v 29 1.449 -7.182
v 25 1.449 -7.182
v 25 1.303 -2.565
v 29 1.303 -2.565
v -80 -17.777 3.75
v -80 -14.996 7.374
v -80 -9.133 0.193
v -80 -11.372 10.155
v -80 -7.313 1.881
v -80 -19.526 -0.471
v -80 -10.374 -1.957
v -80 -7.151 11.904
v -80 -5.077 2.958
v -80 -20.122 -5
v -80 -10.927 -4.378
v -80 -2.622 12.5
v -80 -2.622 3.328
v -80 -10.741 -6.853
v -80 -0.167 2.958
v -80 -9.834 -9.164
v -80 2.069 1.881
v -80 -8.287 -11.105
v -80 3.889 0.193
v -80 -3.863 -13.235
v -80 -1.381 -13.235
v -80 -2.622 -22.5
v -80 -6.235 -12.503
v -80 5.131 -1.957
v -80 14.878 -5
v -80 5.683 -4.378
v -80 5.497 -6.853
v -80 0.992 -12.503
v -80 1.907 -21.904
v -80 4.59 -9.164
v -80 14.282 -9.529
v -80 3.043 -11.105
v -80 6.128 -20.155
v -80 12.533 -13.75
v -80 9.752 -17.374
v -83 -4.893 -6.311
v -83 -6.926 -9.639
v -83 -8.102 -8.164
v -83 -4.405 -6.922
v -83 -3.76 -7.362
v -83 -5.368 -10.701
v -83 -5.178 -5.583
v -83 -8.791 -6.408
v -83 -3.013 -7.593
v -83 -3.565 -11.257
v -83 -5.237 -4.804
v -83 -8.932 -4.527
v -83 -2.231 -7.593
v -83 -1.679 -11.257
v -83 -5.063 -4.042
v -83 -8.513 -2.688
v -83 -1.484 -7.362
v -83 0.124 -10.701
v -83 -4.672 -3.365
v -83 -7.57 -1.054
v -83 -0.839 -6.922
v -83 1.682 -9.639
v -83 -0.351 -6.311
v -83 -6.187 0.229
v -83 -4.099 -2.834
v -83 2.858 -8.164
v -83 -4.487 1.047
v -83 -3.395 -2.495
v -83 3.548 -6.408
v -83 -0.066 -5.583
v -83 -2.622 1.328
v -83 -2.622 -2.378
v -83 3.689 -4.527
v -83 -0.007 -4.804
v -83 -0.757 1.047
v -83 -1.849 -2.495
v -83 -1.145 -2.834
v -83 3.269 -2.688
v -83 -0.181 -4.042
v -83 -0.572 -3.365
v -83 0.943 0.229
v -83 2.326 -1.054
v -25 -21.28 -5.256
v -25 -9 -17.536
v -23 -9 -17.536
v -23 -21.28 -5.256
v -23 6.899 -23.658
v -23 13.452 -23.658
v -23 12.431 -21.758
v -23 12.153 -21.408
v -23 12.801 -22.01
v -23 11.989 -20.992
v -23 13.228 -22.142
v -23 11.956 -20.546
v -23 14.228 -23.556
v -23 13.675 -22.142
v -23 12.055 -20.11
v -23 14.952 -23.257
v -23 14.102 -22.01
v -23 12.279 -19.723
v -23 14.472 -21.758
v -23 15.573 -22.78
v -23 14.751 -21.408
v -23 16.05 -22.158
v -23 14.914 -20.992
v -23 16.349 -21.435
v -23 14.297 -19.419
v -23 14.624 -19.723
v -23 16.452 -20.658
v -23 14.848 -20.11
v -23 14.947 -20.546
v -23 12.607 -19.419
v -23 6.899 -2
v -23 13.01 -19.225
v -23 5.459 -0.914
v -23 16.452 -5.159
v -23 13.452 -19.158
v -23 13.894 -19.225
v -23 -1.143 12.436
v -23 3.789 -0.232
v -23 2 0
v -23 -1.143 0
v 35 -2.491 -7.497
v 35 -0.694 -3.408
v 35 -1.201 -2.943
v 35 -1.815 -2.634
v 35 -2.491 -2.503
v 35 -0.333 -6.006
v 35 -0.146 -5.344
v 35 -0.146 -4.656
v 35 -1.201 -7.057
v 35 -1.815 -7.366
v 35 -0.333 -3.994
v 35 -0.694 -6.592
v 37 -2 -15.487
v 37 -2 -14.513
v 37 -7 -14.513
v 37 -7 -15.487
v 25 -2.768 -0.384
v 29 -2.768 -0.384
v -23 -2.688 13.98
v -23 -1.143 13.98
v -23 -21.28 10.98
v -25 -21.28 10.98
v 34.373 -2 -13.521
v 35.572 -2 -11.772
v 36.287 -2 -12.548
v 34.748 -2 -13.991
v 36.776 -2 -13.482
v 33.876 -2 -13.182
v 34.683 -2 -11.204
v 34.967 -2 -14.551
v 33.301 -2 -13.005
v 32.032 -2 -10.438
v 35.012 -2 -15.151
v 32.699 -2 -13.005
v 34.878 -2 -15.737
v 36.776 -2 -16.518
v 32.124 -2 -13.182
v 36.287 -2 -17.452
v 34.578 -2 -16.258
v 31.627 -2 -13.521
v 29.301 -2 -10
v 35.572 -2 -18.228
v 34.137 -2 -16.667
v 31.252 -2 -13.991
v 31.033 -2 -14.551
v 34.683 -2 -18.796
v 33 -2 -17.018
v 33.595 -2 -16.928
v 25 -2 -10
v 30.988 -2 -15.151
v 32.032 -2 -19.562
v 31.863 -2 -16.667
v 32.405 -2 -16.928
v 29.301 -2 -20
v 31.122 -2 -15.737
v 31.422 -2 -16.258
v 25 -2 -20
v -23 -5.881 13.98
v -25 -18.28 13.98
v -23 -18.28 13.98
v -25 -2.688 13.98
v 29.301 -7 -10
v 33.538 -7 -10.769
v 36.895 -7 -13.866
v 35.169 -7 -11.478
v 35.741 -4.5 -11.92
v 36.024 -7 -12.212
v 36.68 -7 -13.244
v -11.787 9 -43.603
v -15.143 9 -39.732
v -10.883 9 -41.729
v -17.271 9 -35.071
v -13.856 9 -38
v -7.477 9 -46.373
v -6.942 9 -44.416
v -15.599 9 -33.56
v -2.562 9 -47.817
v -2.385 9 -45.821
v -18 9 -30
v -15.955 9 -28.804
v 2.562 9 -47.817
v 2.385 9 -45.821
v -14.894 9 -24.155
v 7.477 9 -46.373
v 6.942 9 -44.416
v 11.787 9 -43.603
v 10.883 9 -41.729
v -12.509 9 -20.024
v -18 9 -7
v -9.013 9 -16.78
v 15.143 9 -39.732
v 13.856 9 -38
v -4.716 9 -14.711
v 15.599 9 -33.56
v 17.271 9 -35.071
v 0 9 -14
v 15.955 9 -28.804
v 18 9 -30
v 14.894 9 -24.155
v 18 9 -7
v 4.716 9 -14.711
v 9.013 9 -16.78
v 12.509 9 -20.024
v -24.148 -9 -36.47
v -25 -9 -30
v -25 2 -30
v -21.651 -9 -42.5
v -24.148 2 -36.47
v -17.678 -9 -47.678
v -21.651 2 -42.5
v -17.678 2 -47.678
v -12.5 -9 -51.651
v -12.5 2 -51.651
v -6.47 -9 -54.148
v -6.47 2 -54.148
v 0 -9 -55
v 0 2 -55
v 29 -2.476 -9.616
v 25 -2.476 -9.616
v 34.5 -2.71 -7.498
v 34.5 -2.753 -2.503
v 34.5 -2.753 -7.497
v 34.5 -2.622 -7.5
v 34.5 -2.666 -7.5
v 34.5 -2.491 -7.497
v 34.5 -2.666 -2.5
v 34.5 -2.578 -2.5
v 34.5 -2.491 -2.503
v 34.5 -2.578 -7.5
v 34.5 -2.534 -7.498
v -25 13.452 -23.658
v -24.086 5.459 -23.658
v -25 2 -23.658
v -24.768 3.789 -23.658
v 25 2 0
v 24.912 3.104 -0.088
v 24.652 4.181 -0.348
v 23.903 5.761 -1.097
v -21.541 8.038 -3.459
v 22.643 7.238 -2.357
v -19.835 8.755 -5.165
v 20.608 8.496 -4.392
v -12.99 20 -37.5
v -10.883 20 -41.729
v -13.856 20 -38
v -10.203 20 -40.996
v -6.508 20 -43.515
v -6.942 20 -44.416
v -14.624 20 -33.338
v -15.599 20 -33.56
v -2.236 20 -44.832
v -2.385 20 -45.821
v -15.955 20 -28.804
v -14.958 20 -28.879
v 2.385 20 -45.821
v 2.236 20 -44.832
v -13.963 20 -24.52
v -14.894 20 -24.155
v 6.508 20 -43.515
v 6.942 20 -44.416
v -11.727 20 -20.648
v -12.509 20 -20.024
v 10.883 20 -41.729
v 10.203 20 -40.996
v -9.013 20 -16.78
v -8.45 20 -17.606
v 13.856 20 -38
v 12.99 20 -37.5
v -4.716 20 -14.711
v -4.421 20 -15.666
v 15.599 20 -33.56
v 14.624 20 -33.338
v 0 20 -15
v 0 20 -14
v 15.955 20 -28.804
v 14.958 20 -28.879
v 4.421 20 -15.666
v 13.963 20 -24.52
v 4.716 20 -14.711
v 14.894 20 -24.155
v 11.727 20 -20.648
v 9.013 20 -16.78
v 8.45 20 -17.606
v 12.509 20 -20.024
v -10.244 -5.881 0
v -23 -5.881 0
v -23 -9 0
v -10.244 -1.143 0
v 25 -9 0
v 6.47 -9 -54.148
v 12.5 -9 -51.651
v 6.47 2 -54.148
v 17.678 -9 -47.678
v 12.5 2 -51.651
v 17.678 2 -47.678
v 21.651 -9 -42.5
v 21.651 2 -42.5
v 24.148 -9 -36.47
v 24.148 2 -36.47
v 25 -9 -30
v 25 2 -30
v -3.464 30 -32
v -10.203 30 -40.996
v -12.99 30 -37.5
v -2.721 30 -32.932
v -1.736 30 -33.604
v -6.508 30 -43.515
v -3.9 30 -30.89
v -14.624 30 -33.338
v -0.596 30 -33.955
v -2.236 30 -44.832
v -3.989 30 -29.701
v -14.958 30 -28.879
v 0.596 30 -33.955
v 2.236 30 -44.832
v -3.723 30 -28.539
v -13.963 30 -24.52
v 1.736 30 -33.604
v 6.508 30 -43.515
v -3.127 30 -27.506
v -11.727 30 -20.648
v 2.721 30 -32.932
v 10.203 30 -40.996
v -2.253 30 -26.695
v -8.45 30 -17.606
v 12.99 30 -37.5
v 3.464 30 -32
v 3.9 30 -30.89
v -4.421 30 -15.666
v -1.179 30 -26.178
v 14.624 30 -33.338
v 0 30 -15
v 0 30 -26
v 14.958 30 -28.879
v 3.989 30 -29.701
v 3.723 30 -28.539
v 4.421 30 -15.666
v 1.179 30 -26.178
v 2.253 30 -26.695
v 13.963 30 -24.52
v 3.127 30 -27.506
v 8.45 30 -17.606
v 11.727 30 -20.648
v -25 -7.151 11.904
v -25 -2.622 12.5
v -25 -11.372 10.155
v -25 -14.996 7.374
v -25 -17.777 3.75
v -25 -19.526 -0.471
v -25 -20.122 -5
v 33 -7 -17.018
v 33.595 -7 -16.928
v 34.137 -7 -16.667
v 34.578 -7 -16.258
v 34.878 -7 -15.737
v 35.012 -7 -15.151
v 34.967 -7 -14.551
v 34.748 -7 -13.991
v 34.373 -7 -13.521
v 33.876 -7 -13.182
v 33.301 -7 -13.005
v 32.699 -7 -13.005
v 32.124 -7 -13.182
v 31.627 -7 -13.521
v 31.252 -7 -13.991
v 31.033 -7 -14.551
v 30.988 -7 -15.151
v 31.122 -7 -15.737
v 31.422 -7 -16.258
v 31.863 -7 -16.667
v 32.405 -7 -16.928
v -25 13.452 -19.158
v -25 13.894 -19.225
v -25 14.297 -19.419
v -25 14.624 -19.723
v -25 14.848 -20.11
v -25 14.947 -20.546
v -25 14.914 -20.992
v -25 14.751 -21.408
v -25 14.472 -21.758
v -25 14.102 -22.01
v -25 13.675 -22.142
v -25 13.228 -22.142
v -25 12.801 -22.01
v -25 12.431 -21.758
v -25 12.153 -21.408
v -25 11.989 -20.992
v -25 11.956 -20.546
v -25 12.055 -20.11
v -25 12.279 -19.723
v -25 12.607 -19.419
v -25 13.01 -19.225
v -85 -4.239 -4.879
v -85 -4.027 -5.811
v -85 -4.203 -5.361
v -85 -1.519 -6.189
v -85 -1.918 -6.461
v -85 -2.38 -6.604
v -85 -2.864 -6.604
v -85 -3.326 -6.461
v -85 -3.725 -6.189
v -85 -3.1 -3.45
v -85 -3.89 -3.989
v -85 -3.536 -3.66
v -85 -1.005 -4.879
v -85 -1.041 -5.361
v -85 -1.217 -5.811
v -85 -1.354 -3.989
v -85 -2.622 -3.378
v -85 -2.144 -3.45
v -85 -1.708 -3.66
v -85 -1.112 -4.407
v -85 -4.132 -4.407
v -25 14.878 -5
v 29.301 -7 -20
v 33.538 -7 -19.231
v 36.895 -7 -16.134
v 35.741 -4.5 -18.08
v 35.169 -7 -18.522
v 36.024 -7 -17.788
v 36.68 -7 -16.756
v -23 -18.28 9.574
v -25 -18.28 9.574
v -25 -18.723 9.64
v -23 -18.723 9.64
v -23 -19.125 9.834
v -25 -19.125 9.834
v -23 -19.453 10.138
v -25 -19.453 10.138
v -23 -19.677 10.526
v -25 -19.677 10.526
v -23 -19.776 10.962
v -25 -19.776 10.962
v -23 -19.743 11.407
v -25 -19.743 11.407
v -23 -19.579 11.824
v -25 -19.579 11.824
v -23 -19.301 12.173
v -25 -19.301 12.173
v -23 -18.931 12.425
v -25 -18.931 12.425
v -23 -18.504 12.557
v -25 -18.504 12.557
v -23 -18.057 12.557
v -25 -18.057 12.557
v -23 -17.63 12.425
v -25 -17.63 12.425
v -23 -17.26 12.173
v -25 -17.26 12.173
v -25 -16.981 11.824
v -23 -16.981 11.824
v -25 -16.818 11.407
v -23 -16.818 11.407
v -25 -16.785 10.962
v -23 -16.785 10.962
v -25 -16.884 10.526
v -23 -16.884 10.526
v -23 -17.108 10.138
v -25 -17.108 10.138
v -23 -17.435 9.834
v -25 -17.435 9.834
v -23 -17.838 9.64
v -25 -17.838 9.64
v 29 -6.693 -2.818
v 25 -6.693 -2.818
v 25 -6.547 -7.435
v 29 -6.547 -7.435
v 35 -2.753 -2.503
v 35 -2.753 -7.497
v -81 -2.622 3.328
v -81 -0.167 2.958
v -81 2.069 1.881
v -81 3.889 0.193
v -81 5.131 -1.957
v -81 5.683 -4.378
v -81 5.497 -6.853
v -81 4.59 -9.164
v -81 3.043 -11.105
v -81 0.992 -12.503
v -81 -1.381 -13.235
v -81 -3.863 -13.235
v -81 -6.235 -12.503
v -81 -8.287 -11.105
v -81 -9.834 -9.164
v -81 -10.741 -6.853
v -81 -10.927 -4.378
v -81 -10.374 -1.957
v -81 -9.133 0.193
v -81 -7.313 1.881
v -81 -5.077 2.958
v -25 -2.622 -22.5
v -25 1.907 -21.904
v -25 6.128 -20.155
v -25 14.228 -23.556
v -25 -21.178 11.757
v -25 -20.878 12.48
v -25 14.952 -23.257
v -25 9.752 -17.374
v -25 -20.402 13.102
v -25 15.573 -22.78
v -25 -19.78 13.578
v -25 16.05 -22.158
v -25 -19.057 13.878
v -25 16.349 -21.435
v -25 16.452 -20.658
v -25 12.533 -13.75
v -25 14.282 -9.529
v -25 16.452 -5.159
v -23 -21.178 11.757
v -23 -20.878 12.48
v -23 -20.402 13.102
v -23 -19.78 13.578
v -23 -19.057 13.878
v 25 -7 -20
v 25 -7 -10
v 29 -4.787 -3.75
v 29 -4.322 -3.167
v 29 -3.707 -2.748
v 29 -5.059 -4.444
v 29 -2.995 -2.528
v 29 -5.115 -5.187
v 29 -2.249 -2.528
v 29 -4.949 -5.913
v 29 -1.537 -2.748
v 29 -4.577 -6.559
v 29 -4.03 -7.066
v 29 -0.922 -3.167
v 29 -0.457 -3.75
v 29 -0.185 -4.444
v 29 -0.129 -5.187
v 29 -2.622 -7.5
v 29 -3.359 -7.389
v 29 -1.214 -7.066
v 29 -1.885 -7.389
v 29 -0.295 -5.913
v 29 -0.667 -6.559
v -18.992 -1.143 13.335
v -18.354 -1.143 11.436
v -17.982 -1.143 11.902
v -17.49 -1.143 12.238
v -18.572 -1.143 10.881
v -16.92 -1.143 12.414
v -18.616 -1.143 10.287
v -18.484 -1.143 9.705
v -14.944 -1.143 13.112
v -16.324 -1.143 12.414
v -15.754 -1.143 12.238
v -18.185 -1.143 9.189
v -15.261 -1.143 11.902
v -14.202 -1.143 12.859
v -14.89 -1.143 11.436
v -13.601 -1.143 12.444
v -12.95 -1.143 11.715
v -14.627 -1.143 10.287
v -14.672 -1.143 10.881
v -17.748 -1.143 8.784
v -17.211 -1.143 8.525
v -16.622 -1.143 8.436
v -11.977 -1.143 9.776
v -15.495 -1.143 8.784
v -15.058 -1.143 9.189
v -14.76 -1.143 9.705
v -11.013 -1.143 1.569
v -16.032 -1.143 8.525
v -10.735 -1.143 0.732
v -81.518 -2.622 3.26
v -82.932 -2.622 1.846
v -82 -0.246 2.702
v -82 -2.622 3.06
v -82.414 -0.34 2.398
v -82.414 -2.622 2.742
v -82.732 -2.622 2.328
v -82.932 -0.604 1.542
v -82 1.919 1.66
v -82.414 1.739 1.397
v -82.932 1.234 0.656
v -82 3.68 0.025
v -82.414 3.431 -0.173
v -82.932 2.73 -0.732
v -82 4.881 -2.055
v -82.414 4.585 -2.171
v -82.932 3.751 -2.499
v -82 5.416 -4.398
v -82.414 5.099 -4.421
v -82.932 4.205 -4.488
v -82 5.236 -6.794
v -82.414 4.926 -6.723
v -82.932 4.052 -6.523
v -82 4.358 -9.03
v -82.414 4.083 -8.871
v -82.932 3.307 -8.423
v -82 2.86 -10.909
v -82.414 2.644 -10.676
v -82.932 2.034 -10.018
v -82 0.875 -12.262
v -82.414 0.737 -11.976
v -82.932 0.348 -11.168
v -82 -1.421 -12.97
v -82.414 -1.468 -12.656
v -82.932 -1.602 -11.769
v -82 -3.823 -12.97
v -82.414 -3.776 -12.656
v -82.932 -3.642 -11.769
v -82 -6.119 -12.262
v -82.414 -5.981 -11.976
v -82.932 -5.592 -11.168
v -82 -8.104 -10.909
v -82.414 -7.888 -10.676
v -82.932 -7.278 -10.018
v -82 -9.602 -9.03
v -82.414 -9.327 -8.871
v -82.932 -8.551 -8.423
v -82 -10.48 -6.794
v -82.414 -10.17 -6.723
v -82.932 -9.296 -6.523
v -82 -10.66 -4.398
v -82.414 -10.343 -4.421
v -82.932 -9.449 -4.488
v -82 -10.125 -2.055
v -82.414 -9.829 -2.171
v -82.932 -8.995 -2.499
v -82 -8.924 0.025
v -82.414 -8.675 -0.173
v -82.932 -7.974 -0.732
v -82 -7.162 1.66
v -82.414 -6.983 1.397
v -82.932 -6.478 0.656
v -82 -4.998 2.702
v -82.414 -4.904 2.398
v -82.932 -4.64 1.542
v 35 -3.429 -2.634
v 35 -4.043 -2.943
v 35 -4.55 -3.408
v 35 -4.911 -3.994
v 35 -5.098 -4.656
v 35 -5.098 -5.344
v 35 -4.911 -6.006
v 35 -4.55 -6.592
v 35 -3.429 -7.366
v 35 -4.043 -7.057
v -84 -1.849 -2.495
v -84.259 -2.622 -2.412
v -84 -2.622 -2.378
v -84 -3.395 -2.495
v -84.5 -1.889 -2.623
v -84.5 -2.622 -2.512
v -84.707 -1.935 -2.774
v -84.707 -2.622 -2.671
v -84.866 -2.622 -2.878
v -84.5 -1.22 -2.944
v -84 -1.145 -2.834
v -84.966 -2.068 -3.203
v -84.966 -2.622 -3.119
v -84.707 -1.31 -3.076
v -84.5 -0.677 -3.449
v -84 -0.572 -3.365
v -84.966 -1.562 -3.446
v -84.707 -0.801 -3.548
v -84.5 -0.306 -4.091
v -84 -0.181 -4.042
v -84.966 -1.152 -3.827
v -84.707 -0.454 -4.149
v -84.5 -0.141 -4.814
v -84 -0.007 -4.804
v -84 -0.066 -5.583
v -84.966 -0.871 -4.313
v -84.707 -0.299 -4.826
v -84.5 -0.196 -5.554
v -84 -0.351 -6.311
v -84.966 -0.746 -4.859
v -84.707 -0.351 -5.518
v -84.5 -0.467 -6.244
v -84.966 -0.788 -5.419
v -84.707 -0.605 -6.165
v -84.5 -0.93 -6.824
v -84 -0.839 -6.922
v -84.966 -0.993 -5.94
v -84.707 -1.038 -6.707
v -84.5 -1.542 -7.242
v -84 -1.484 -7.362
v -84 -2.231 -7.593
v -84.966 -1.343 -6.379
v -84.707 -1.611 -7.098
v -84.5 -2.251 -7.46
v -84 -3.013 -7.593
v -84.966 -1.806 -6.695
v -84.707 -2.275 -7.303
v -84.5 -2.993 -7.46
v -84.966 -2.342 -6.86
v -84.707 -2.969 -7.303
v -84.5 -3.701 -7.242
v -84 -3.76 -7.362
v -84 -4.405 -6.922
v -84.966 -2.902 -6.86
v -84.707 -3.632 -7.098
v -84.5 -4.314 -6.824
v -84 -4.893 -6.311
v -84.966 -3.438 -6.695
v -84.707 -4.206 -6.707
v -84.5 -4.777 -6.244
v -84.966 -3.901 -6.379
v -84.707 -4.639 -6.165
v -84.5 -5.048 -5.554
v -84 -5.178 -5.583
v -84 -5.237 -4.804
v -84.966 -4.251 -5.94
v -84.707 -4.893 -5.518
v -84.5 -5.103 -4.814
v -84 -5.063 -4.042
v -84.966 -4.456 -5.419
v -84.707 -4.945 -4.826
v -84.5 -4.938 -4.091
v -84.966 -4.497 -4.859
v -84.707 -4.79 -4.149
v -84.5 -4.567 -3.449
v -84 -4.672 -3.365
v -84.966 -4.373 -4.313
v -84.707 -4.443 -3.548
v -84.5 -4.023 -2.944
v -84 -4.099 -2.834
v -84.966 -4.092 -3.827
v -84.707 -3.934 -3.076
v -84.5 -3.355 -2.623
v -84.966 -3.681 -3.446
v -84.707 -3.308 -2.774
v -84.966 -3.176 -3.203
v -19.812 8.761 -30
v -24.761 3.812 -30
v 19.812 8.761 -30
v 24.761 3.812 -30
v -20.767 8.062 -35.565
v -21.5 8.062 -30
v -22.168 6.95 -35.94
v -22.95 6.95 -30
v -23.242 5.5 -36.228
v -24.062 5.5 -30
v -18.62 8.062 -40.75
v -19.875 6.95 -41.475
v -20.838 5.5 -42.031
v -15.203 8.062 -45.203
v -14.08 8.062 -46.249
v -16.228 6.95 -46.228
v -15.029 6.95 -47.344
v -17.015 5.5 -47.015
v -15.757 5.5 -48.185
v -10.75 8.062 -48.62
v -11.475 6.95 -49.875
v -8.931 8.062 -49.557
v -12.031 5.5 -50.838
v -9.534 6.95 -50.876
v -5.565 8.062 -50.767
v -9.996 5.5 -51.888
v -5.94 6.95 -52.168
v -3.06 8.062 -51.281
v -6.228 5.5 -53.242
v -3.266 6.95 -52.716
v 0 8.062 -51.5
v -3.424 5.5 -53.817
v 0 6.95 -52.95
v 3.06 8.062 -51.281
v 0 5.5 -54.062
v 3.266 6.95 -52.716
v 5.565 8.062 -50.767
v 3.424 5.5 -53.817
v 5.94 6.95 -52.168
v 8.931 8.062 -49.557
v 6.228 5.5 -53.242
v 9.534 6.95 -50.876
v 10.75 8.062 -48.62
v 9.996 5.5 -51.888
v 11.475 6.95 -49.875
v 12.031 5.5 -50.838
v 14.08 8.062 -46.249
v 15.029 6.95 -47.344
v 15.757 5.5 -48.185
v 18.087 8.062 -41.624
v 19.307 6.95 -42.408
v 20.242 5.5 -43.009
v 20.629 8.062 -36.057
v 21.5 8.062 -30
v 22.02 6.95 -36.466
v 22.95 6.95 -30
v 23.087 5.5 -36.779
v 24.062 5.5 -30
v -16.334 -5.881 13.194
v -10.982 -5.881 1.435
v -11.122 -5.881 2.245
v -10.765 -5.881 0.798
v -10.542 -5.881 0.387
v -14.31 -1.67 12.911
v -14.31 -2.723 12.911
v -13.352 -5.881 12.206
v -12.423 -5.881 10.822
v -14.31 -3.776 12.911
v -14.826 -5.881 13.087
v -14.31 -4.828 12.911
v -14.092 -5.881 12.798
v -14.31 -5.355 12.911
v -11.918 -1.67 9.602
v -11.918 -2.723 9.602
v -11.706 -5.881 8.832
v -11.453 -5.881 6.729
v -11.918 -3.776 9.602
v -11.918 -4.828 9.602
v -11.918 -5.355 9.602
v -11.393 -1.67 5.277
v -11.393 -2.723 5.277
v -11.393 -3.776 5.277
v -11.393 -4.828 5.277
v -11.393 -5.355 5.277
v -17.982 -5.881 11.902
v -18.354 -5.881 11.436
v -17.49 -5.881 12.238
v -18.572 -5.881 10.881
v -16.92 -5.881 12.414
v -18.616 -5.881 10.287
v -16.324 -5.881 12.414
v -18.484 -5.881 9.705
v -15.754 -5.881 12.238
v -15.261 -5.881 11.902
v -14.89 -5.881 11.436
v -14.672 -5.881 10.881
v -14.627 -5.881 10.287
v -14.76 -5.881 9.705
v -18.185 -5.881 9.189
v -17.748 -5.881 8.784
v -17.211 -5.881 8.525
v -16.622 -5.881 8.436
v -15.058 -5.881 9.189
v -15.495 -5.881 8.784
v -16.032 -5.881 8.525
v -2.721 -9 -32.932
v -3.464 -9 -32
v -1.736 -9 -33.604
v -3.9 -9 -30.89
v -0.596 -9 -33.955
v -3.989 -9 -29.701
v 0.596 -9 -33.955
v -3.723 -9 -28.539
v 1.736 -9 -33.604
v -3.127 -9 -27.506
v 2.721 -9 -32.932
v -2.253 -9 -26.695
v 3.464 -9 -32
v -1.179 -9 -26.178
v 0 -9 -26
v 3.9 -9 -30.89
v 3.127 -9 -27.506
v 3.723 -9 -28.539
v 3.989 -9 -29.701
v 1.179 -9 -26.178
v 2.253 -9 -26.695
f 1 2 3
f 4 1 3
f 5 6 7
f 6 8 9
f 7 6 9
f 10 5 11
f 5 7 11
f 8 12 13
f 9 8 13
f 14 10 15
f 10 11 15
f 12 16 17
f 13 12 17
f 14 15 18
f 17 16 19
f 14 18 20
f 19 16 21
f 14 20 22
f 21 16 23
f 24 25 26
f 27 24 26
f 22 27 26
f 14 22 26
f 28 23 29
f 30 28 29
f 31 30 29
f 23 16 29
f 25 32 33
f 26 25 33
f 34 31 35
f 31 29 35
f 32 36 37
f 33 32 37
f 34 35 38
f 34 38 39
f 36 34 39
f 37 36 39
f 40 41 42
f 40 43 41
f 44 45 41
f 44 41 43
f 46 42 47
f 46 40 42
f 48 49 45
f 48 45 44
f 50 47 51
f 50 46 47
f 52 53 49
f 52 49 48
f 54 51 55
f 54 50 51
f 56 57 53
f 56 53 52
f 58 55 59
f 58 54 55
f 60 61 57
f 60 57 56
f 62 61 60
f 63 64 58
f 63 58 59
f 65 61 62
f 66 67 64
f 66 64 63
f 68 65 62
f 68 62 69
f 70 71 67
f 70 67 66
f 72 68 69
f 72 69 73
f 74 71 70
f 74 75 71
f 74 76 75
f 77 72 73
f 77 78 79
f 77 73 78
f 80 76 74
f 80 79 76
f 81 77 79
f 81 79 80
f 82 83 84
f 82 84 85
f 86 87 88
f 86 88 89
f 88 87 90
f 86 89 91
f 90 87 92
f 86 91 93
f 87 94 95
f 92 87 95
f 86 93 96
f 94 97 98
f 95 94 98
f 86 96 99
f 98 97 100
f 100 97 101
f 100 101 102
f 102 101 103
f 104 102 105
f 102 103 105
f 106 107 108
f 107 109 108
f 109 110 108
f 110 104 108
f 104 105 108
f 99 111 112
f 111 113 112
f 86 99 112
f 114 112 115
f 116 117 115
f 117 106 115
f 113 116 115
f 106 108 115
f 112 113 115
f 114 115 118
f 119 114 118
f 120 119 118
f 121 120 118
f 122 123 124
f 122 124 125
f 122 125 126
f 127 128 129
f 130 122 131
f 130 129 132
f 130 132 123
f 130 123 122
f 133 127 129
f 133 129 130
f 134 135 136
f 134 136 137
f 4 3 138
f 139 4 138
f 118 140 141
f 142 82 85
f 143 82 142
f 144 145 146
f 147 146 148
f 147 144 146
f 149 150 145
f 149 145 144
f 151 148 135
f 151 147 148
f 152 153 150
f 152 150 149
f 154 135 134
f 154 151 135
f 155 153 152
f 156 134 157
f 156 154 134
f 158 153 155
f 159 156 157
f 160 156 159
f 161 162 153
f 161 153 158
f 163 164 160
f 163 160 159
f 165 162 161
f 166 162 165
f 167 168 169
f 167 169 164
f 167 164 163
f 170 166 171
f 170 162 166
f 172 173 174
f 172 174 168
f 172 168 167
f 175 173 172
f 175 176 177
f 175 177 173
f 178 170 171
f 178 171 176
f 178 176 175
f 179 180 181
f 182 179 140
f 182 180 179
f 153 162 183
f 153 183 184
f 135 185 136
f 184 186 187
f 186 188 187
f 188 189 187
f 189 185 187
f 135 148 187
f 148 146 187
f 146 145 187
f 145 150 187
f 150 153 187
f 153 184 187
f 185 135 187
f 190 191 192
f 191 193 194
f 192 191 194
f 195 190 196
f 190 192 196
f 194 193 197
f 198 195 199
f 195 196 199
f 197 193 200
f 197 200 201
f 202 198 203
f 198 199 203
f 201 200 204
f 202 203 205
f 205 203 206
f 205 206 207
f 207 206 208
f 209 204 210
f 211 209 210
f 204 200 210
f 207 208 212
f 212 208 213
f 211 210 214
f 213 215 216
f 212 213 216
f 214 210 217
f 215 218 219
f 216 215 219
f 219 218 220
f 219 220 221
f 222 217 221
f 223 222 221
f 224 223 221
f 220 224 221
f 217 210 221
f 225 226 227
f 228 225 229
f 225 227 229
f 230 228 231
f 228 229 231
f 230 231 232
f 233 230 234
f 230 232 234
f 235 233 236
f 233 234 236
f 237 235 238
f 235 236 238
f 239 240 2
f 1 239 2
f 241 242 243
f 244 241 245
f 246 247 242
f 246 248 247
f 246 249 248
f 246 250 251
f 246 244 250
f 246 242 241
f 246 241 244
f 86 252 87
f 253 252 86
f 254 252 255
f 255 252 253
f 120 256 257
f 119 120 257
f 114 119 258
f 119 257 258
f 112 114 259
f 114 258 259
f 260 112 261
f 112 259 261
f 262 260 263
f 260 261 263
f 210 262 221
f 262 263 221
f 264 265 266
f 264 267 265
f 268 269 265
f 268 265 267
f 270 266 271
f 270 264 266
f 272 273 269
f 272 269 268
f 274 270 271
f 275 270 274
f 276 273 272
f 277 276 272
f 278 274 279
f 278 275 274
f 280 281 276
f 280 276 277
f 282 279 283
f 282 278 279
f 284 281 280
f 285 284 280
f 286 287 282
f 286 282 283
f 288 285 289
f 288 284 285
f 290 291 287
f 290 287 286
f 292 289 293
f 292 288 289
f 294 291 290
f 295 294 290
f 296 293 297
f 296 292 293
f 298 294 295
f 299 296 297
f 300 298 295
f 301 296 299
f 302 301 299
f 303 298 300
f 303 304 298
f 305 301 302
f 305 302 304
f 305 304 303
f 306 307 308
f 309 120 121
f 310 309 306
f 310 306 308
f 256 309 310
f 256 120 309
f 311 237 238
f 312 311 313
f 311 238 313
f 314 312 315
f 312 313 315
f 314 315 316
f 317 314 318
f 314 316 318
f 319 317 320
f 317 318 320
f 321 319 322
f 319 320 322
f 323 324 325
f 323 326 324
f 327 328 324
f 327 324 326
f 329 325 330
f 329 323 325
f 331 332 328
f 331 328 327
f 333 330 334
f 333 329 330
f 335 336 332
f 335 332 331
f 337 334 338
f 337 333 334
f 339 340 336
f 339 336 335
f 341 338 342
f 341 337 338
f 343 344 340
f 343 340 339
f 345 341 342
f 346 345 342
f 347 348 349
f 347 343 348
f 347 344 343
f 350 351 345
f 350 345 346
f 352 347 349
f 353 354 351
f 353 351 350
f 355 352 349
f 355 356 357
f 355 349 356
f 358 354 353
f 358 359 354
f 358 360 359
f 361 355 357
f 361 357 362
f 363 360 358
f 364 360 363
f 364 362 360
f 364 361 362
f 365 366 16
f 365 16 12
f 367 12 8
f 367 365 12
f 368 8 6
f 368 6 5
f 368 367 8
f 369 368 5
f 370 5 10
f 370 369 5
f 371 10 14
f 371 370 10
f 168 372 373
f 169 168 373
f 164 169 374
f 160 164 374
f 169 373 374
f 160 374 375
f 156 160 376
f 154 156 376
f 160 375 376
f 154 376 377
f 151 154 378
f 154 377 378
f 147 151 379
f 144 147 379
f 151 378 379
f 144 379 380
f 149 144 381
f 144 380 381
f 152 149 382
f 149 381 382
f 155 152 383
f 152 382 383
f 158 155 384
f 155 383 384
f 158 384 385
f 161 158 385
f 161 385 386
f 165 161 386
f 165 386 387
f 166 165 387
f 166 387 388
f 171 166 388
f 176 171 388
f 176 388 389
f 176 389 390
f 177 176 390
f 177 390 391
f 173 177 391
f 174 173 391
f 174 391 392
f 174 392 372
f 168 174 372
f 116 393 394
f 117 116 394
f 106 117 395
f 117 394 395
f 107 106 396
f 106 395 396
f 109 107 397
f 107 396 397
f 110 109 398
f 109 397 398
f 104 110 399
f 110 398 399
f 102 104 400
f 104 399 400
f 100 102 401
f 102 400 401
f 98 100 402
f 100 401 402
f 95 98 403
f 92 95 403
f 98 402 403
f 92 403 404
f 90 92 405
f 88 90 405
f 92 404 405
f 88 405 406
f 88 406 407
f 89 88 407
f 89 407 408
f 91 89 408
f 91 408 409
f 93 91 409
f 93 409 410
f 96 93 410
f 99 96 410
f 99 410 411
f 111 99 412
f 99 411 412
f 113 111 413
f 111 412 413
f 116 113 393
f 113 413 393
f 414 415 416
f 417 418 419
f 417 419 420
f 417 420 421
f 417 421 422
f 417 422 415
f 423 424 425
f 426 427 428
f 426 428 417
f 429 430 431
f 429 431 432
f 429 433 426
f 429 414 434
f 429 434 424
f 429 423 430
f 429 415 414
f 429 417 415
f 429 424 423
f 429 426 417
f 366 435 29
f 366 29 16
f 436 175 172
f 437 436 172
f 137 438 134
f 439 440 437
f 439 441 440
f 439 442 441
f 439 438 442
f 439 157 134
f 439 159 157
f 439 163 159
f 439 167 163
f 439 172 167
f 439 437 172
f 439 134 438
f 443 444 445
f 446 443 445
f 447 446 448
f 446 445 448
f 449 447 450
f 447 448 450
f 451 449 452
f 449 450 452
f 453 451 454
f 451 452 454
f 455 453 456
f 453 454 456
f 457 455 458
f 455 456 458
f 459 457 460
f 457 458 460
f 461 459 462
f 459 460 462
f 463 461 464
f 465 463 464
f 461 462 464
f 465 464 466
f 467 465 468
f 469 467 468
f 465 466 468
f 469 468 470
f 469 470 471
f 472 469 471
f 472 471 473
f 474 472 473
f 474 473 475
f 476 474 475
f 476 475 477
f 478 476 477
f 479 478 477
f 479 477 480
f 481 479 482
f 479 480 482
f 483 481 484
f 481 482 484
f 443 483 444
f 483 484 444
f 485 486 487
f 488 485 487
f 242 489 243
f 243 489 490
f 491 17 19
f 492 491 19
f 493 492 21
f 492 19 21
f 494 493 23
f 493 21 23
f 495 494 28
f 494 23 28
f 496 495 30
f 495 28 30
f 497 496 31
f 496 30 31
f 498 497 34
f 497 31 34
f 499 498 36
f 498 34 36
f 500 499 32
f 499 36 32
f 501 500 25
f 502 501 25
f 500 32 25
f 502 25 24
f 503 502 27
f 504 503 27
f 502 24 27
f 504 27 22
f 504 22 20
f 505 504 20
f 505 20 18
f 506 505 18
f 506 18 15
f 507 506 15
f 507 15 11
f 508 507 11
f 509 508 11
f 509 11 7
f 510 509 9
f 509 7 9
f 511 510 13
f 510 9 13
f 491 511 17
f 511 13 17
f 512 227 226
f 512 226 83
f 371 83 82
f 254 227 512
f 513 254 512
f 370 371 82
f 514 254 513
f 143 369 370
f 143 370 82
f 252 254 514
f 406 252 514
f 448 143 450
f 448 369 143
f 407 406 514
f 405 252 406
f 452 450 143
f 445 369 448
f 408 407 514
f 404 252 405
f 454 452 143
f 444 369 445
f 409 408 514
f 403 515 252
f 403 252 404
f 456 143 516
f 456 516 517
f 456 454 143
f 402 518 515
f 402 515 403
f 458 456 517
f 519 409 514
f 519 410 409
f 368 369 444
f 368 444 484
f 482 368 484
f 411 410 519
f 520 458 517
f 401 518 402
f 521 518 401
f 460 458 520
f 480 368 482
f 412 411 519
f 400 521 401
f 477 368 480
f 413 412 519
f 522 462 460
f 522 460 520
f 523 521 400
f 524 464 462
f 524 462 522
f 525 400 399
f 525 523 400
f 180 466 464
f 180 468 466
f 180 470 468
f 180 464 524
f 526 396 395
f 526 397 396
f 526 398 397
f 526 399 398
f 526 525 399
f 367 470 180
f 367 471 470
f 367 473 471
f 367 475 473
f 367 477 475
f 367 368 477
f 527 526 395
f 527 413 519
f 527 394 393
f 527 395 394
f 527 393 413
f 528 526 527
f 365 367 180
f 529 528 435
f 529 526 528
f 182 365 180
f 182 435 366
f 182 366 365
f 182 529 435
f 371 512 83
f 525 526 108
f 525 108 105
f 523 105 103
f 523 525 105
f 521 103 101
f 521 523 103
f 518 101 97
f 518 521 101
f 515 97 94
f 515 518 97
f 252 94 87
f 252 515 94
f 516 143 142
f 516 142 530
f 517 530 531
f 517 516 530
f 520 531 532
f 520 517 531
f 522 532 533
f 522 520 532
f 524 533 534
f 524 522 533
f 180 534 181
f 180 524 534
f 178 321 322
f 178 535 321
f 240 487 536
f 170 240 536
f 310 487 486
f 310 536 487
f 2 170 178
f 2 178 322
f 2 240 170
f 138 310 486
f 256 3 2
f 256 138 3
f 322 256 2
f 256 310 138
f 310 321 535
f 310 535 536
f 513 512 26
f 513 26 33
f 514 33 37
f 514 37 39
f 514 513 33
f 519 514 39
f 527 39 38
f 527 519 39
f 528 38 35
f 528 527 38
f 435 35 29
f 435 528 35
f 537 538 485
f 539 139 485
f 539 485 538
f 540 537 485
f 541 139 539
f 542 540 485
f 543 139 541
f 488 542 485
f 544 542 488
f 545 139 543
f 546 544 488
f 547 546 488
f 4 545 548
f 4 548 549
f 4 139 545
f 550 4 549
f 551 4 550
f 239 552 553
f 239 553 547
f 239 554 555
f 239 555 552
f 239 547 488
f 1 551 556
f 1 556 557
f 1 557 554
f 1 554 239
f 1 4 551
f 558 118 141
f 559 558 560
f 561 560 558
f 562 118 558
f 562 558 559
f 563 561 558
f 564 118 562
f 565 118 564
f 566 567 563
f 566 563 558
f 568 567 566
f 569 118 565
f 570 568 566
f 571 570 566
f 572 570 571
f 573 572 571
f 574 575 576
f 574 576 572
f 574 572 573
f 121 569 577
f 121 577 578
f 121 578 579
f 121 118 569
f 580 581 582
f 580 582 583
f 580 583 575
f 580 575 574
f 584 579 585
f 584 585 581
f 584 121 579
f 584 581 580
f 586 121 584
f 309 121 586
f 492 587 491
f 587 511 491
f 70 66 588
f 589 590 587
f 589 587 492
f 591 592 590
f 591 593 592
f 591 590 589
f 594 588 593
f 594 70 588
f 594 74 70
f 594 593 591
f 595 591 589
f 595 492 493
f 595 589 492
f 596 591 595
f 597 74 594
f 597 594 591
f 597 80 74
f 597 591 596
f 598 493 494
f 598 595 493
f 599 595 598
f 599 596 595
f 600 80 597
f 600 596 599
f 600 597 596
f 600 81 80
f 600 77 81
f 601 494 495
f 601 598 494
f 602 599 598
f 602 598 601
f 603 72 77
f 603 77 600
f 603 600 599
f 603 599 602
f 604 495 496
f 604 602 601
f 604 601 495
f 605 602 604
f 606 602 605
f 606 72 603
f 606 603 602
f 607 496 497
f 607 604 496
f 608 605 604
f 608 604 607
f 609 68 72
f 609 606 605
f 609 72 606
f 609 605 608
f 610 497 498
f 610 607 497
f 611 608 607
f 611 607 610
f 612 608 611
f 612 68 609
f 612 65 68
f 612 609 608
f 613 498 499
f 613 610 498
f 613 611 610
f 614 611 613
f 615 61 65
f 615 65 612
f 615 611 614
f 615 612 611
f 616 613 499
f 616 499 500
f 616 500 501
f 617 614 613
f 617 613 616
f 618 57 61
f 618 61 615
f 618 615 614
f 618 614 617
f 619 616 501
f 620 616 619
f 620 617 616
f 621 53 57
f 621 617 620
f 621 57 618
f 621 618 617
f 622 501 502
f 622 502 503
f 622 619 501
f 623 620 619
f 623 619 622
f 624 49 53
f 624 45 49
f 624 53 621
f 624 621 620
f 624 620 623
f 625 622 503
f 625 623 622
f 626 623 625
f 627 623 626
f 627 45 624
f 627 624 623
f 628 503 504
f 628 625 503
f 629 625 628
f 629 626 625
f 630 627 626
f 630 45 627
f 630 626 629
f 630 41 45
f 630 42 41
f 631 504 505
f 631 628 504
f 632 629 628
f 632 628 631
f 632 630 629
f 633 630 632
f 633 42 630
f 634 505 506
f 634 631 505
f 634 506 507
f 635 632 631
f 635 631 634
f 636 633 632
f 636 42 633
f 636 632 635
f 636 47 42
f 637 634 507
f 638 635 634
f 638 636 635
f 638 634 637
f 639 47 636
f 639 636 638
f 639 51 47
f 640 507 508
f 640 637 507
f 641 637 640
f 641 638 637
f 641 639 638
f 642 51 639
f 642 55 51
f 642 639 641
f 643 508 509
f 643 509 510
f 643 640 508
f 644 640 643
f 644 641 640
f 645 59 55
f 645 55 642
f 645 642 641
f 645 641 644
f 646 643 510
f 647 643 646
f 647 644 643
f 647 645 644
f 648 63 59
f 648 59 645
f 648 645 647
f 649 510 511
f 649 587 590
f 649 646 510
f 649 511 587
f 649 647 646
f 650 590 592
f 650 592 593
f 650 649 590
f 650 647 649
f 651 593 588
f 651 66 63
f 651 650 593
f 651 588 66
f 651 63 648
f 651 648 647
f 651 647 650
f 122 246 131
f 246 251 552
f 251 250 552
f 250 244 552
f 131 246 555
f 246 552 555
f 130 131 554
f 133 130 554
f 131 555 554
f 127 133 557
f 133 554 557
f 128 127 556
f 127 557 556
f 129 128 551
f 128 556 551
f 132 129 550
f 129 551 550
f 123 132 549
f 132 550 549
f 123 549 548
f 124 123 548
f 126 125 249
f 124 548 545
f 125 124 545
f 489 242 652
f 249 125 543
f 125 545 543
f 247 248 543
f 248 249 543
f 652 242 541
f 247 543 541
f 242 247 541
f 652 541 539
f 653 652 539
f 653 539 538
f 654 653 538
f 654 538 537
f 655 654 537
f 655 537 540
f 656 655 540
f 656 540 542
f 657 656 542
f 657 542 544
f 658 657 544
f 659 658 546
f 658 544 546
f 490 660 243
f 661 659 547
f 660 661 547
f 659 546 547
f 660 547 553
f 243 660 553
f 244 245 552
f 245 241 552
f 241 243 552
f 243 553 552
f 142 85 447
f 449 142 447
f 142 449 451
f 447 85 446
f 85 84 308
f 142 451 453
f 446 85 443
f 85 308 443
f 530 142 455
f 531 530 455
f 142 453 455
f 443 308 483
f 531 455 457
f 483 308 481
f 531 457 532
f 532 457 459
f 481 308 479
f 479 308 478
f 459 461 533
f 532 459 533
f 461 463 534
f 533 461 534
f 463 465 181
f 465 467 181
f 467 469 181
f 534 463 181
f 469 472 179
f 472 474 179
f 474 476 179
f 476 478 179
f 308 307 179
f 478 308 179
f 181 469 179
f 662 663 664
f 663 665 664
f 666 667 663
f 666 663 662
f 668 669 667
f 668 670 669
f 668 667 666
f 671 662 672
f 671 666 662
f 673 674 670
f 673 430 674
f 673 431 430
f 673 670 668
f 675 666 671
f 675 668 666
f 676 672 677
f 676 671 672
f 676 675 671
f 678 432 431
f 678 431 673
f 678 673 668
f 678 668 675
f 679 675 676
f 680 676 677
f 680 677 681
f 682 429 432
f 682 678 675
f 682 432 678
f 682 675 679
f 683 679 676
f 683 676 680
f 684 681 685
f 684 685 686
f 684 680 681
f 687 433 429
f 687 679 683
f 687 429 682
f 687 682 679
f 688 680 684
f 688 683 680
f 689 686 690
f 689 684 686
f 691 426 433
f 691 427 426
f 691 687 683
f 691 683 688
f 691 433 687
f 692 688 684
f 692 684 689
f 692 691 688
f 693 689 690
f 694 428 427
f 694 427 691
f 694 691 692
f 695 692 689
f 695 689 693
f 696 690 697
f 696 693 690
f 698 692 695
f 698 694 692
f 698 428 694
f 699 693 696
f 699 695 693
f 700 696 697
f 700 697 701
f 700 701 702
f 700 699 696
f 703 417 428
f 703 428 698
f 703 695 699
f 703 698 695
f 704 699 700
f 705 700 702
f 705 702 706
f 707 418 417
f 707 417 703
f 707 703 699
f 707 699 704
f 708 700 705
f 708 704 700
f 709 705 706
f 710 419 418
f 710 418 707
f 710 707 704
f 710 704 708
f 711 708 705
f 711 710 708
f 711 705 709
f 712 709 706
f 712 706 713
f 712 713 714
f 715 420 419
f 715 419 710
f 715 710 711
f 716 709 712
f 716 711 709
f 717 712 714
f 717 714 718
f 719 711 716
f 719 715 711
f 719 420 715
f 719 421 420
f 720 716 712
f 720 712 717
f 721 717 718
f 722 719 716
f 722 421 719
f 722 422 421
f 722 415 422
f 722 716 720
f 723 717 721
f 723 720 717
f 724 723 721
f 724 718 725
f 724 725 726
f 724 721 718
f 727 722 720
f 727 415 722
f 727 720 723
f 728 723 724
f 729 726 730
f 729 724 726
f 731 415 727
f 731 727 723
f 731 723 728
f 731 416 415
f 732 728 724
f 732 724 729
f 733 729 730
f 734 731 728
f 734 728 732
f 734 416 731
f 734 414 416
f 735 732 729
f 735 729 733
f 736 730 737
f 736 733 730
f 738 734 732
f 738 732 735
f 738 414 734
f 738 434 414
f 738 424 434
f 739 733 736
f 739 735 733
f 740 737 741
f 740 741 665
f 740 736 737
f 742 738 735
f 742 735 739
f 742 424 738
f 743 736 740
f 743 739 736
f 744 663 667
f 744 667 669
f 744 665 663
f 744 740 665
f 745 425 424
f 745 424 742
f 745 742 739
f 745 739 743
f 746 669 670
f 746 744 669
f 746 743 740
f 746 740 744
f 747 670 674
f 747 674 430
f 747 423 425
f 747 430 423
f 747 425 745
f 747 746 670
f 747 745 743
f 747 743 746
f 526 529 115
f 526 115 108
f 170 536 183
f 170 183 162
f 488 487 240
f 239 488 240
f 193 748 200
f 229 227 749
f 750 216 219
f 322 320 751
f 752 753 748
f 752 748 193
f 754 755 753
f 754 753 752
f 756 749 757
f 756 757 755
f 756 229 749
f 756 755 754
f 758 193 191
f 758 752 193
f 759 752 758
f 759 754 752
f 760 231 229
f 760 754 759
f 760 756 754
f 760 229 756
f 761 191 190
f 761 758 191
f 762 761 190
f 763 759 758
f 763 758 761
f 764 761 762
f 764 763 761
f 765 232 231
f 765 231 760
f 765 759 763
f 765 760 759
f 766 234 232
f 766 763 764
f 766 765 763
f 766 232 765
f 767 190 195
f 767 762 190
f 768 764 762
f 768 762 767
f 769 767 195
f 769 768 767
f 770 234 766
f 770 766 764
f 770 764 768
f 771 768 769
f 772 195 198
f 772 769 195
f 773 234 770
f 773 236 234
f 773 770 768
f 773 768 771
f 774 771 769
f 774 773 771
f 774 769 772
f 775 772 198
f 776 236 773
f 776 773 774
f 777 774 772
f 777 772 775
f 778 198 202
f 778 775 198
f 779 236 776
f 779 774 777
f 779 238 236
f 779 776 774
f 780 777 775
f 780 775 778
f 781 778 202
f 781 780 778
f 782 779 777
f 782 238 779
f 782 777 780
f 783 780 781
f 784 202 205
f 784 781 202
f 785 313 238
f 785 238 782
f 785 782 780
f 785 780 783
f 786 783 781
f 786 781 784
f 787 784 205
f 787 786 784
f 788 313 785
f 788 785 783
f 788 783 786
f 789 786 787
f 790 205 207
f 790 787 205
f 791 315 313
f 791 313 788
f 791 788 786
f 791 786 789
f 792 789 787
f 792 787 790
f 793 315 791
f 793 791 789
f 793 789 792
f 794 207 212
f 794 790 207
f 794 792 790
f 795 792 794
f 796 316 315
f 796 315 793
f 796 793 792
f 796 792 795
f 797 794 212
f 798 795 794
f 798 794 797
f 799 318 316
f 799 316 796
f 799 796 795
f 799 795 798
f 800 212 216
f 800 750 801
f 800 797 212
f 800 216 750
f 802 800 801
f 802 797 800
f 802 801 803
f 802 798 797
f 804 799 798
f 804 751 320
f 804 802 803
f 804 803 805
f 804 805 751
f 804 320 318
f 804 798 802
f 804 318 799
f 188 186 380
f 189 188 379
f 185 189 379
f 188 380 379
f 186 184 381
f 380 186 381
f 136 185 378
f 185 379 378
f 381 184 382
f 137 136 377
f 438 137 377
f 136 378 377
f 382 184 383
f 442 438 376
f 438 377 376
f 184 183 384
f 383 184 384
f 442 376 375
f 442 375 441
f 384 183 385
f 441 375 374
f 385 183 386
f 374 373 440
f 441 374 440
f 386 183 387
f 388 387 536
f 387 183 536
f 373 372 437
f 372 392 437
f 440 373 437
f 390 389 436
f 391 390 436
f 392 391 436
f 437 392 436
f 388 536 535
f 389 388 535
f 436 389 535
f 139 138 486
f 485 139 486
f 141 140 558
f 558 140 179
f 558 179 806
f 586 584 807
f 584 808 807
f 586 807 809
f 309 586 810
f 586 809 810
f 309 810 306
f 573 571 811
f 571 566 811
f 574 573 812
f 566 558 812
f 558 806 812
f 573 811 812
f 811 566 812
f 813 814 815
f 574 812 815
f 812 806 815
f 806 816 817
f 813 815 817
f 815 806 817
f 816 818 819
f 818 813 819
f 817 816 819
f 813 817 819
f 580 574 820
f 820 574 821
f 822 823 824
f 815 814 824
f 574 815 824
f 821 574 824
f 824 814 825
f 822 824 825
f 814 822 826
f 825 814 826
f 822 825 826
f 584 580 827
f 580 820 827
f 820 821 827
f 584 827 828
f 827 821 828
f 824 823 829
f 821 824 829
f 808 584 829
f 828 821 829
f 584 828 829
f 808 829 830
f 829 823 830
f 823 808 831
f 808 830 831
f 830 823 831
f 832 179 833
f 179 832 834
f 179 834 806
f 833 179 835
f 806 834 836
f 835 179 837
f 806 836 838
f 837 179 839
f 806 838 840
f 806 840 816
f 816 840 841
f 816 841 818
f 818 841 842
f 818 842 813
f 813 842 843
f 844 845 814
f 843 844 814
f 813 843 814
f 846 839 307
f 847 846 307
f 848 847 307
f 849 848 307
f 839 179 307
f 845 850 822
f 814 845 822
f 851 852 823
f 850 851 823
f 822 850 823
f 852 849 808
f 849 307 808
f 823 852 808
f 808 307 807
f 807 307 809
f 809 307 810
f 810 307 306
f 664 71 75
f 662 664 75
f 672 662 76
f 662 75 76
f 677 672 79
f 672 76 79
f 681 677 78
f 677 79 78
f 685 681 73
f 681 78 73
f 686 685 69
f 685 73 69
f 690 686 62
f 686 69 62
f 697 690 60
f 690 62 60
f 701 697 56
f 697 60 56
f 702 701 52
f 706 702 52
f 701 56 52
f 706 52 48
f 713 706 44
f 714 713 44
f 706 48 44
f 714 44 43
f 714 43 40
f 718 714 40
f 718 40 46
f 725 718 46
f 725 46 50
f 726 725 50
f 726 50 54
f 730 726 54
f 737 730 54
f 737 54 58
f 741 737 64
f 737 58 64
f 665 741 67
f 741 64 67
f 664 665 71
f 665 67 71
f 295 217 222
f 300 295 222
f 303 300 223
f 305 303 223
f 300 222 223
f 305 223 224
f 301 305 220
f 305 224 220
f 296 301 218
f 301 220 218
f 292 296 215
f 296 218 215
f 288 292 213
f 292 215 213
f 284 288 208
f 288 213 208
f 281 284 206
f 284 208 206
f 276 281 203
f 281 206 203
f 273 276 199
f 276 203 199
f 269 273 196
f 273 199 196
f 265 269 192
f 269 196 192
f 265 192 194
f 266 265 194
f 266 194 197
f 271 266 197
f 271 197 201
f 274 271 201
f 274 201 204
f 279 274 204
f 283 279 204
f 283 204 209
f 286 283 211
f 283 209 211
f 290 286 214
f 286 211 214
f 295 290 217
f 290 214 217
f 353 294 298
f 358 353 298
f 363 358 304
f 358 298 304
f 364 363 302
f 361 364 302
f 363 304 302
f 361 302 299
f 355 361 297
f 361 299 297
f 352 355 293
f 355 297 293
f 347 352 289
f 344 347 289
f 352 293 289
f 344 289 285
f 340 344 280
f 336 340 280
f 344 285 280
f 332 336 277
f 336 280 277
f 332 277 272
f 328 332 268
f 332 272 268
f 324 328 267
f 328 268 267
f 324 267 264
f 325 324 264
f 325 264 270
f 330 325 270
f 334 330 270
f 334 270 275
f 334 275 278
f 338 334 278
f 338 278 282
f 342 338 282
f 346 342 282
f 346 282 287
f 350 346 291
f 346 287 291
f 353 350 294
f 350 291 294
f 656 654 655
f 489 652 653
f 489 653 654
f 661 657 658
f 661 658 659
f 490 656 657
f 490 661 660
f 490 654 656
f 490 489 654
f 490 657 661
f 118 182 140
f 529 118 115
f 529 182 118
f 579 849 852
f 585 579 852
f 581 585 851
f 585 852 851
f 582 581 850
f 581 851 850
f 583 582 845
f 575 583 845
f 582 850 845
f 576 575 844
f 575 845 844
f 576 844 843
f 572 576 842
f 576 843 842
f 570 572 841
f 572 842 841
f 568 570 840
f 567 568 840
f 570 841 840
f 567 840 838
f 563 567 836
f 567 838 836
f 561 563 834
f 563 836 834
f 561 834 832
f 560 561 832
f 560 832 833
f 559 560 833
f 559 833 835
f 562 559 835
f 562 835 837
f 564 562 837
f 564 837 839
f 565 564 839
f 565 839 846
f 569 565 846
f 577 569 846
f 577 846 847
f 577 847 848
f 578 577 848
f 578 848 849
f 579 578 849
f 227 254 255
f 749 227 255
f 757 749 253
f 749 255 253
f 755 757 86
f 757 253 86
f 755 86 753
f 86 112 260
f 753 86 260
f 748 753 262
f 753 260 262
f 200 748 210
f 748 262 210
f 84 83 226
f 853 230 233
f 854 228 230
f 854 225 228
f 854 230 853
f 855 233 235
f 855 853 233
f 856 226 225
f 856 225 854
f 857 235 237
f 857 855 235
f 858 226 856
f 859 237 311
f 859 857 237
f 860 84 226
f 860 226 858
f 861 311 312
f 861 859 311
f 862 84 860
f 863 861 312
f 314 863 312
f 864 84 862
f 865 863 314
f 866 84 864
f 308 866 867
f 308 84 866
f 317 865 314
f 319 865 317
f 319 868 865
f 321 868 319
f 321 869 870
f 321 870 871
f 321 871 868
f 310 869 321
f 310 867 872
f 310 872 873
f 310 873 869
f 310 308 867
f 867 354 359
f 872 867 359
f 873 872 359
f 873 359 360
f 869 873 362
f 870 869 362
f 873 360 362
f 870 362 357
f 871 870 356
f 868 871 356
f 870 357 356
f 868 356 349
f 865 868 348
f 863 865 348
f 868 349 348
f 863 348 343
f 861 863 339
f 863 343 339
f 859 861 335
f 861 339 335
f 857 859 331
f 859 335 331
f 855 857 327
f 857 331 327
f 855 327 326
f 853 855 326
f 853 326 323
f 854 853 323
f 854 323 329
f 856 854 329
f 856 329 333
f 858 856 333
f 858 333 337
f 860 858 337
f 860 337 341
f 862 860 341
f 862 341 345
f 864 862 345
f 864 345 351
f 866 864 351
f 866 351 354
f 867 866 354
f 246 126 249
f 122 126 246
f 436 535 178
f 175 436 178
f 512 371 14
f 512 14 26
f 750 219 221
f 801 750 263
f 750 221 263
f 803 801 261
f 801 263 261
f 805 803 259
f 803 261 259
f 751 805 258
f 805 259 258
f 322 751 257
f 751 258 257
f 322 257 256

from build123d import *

# Parameters (mm, degrees)
SKETCH2_W                = 50
SKETCH2_H                = 18
BOSS_EXTRUDE1_DEPTH      = 60
CUT_EXTRUDE1_DEPTH       = 50
SKETCH4_R                = 16
BOSS_EXTRUDE2_DEPTH      = 11
SKETCH5_R                = 15
BOSS_EXTRUDE3_DEPTH      = 10
SKETCH6_R                = 4
CUT_EXTRUDE2_DEPTH       = 45
FILLET1_R                = 7
FILLET6_R                = 7
SKETCH7_W                = 10
SKETCH7_H                = 5
BOSS_EXTRUDE4_DEPTH      = 12
SKETCH8_R                = 2.017979808
CUT_EXTRUDE3_DEPTH       = 10
CUT_EXTRUDE4_DEPTH       = 10
BOSS_EXTRUDE5_DEPTH      = 4
BOSS_EXTRUDE6_DEPTH      = 6
BOSS_EXTRUDE6_DEPTH_BACK = 73
SKETCH12_R               = 2.5
SKETCH15_W               = 6.308184524
SKETCH15_H               = 0.262670096
CUT_EXTRUDE6_DEPTH       = 0.5
BOSS_EXTRUDE7_DEPTH      = 55
SKETCH22_R               = 8.328168783
BOSS_EXTRUDE8_DEPTH      = 3
SKETCH23_R               = 2.62195597
BOSS_EXTRUDE9_DEPTH      = 2
FILLET7_R                = 2
FILLET8_R                = 1
BOSS_EXTRUDE10_DEPTH     = 2
SKETCH25_R               = 1.5
CUT_EXTRUDE7_DEPTH       = 2
SKETCH27_W               = 12.756486499
SKETCH27_H               = 4.738083454
BOSS_EXTRUDE11_DEPTH     = 14
SKETCH28_R               = 2
CUT_EXTRUDE8_DEPTH       = 14


with BuildPart() as part:
    # Sketch2 → Boss-Extrude1 (new body)
    with BuildSketch(Plane.XY):
        Rectangle(SKETCH2_W, SKETCH2_H)
    extrude(amount=-BOSS_EXTRUDE1_DEPTH)

    # Sketch3 → Cut-Extrude1 (cut)
    with BuildSketch(Plane(origin=(0, 9, 0), x_dir=(1, 0, 0), z_dir=(0, 1, 0))):
        with BuildLine():
            Line((0, 55), (0, 60))
            Line((0, 60), (-25, 60))
            Line((-25, 60), (-25, 30))
            ThreePointArc((-25, 30), (-17.67766953, 47.67766953), (0, 55))
        make_face()
        with BuildLine():
            Line((25, 60), (0, 60))
            Line((0, 60), (0, 55))
            ThreePointArc((0, 55), (17.67766953, 47.67766953), (25, 30))
            Line((25, 30), (25, 60))
        make_face()
    extrude(amount=-CUT_EXTRUDE1_DEPTH, mode=Mode.SUBTRACT)

    # Sketch4 → Boss-Extrude2 (add)
    with BuildSketch(Plane(origin=(0, 9, 0), x_dir=(1, 0, 0), z_dir=(0, 1, 0))):
        with Locations(Location((0, 30, 0), (0, 0, 270))):
            Circle(SKETCH4_R)
    extrude(amount=BOSS_EXTRUDE2_DEPTH)

    # Sketch5 → Boss-Extrude3 (add)
    with BuildSketch(Plane(origin=(0, 20, 0), x_dir=(1, 0, 0), z_dir=(0, 1, 0))):
        with Locations(Location((0, 30, 0), (0, 0, 270))):
            Circle(SKETCH5_R)
    extrude(amount=BOSS_EXTRUDE3_DEPTH)

    # Sketch6 → Cut-Extrude2 (cut)
    with BuildSketch(Plane(origin=(0, 30, 0), x_dir=(1, 0, 0), z_dir=(0, 1, 0))):
        with Locations(Location((0, 30, 0), (0, 0, 270))):
            Circle(SKETCH6_R)
    extrude(amount=-CUT_EXTRUDE2_DEPTH, mode=Mode.SUBTRACT)

    # Fillet1
    fillet1_edges = [part.edges().sort_by_distance(p)[0] for p in [
        (0, 9, 0),
    ]]
    fillet(fillet1_edges, radius=FILLET1_R)

    # Fillet6
    # the kernel refuses this fillet: 7 mm, written as the material it takes off along each edge
    with BuildSketch(Plane(origin=(-25, 9, 10.5), x_dir=(0, -1, 0), z_dir=(0, 0, -1))) as fillet6_piece_1:
        with BuildLine():
            CenterArc((FILLET6_R, -FILLET6_R), FILLET6_R, 90, 90)
            Line((0, -FILLET6_R), (0, 0))
            Line((0, 0), (FILLET6_R, 0))
        make_face()
    extrude(amount=40.5, mode=Mode.SUBTRACT)
    with BuildSketch(Plane(origin=(0, 9, -30), x_dir=(-1, 0, 0), z_dir=(0, 0, 1))) as fillet6_piece_2:
        with BuildLine():
            CenterArc((25 - FILLET6_R, FILLET6_R), FILLET6_R, 270, 90)
            Line((25, FILLET6_R), (25, 0))
            Line((25, 0), (25 - FILLET6_R, 0))
        make_face()
    revolve(axis=Axis((0, 9, -30), (0, -1, 0)), revolution_arc=180, mode=Mode.SUBTRACT)
    with BuildSketch(Plane(origin=(25, 9, 10.5), x_dir=(0, -1, 0), z_dir=(0, 0, -1))) as fillet6_piece_3:
        with BuildLine():
            CenterArc((FILLET6_R, FILLET6_R), FILLET6_R, 180, 90)
            Line((0, FILLET6_R), (0, 0))
            Line((0, 0), (FILLET6_R, 0))
        make_face()
    extrude(amount=40.5, mode=Mode.SUBTRACT)

    # Sketch7 → Boss-Extrude4 (add)
    with BuildSketch(Plane(origin=(25, 0, 0), x_dir=(0, 0, -1), z_dir=(1, 0, 0))):
        with Locations((15, -4.5)):
            Rectangle(SKETCH7_W, SKETCH7_H)
    extrude(amount=BOSS_EXTRUDE4_DEPTH)

    # Sketch8 → Cut-Extrude3 (cut)
    with BuildSketch(Plane(origin=(0, -7, 0), x_dir=(-1, 0, 0), z_dir=(0, -1, 0))):
        with Locations(Location((-33, 15, 0), (0, 0, 90))):
            Circle(SKETCH8_R)
    extrude(amount=-CUT_EXTRUDE3_DEPTH, mode=Mode.SUBTRACT)

    # Sketch9 → Cut-Extrude4 (cut)
    with BuildSketch(Plane.XZ.offset(7)):
        with BuildLine():
            Line((37, -20), (37, -15.487118702))
            add(Edge.make_bspline(
                [(29.301025402, -20), (31.159014878, -19.577955894), (35.343998587, -19.634790074), (36.930791765, -16.465392679), (37, -15.487118702)],
                knots=[0, 0, 0, 0, 0.665986255, 0.952522337, 0.952522337, 0.952522337, 0.952522337], degree=3))
            Line((29.301025402, -20), (37, -20))
        make_face()
        with BuildLine():
            Line((37, -10), (29.301025402, -10))
            add(Edge.make_bspline(
                [(29.301025402, -10), (31.159014878, -10.422044106), (35.343998587, -10.365209926), (36.930791765, -13.534607321), (37, -14.512881298)],
                knots=[0, 0, 0, 0, 0.665986255, 0.952522337, 0.952522337, 0.952522337, 0.952522337], degree=3))
            Line((37, -14.512881298), (37, -10))
        make_face()
    extrude(amount=-CUT_EXTRUDE4_DEPTH, mode=Mode.SUBTRACT)

    # Sketch10 → Boss-Extrude5 (add)
    with BuildSketch(Plane(origin=(25, 0, 0), x_dir=(0, 0, -1), z_dir=(1, 0, 0))):
        Polygon((7.181671506, 1.449117939), (2.565182327, 1.302963931), (0.383510821, -2.768109978), (2.818328494, -6.693029879), (7.434817673, -6.546875871), (9.616489179, -2.475801962), align=None)
    extrude(amount=BOSS_EXTRUDE5_DEPTH)

    # Sketch12 → Boss-Extrude6 (add, two sides: drawn at the far end of the back side and taken through both)
    with BuildSketch(Plane(origin=(29, 0, 0), x_dir=(0, 0, -1), z_dir=(1, 0, 0)).offset(-BOSS_EXTRUDE6_DEPTH_BACK)):
        with Locations((5, -2.62195597)):
            Circle(SKETCH12_R)
    extrude(amount=BOSS_EXTRUDE6_DEPTH + BOSS_EXTRUDE6_DEPTH_BACK)

    # Sketch15 → Cut-Extrude6 (cut)
    with BuildSketch(Plane(origin=(35, 0, 0), x_dir=(0, 0, -1), z_dir=(1, 0, 0))):
        with Locations((5, -2.62195597)):
            Rectangle(SKETCH15_W, SKETCH15_H)
    extrude(amount=-CUT_EXTRUDE6_DEPTH, mode=Mode.SUBTRACT)

    # Sketch16 → Boss-Extrude7 (add)
    with BuildSketch(Plane.ZY.offset(25)):
        with BuildLine():
            Line((-5, 14.87804403), (12.5, -2.62195597))
            ThreePointArc((12.5, -2.62195597), (7.374368671, -14.996324641), (-5, -20.12195597))
            Line((-5, -20.12195597), (-22.5, -2.62195597))
            ThreePointArc((-22.5, -2.62195597), (-17.374368671, 9.752412701), (-5, 14.87804403))
        make_face()
    extrude(amount=BOSS_EXTRUDE7_DEPTH)

    # Sketch22 → Boss-Extrude8 (add)
    with BuildSketch(Plane.ZY.offset(80)):
        with Locations((-5, -2.62195597)):
            Circle(SKETCH22_R)
    extrude(amount=BOSS_EXTRUDE8_DEPTH)

    # Sketch23 → Boss-Extrude9 (add)
    with BuildSketch(Plane.ZY.offset(83)):
        with Locations((-5, -2.62195597)):
            Circle(SKETCH23_R)
    extrude(amount=BOSS_EXTRUDE9_DEPTH)

    # Fillet7
    fillet7_edges = [part.edges().sort_by_distance(p)[0] for p in [
        (-83, -2.62195597, -13.328168783),
    ]]
    fillet(fillet7_edges, radius=FILLET7_R)

    # Fillet8
    fillet8_edges = [part.edges().sort_by_distance(p)[0] for p in [
        (-85, -2.62195597, -7.62195597),
    ]]
    fillet(fillet8_edges, radius=FILLET8_R)

    # Sketch24 → Boss-Extrude10 (add)
    with BuildSketch(Plane(origin=(-25, 0, 0), x_dir=(0, 0, -1), z_dir=(1, 0, 0))):
        with BuildLine():
            Line((-13.980304455, -2.688046863), (5.159392937, 16.451650529))
            Line((5.159392937, 16.451650529), (20.658441278, 16.451650529))
            ThreePointArc((20.658441278, 16.451650529), (22.779761622, 15.572970872), (23.658441278, 13.451650529))
            Line((23.658441278, 13.451650529), (23.658441278, -2.877728254))
            Line((23.658441278, -2.877728254), (5.255772284, -21.280397249))
            Line((5.255772284, -21.280397249), (-10.980304455, -21.280397249))
            ThreePointArc((-10.980304455, -21.280397249), (-13.101624798, -20.401717592), (-13.980304455, -18.280397249))
            Line((-13.980304455, -18.280397249), (-13.980304455, -2.688046863))
        make_face()
    extrude(amount=BOSS_EXTRUDE10_DEPTH)

    # Sketch25 → Cut-Extrude7 (cut)
    with BuildSketch(Plane.ZY.offset(25)):
        with Locations((-20.658441278, 13.451650529)):
            Circle(SKETCH25_R)
        with Locations(Location((11.073606499, -18.280397249, 0), (0, 0, 180))):
            Circle(SKETCH25_R)
    extrude(amount=-CUT_EXTRUDE7_DEPTH, mode=Mode.SUBTRACT)

    # Sketch27 → Boss-Extrude11 (add)
    with BuildSketch(Plane.XY):
        with Locations((-16.621756751, -3.512365056)):
            Rectangle(SKETCH27_W, SKETCH27_H)
    extrude(amount=BOSS_EXTRUDE11_DEPTH)

    # Sketch28 → Cut-Extrude8 (cut)
    with BuildSketch(Plane(origin=(0, -5.881406783, 0), x_dir=(-1, 0, 0), z_dir=(0, -1, 0))):
        with BuildLine():
            add(Edge.make_bspline(
                [(23, -13.980304455), (21.040358256, -13.849946774), (18.327335378, -12.869508638), (14.76618265, -13.383152912), (13.195630898, -12.157690347), (12.453642875, -10.967120732), (11.825664424, -9.487701946), (11.427276145, -7.580341481), (11.452990141, -5.432672222), (11.129880797, -2.792351119), (11.084820543, -0.923222192), (10.243513501, 0)],
                knots=[0, 0, 0, 0, 0.253392468, 0.384448091, 0.437710576, 0.505134134, 0.567821926, 0.648624813, 0.759593973, 0.849288238, 1, 1, 1, 1], degree=3))
            Line((10.243513501, 0), (10.243513501, -14))
            Line((10.243513501, -14), (23, -14))
            Line((23, -14), (23, -13.980304455))
        make_face()
        with Locations(Location((16.62175675, -10.436159793, 0), (0, 0, 90))):
            Circle(SKETCH28_R)
    extrude(amount=-CUT_EXTRUDE8_DEPTH, mode=Mode.SUBTRACT)


solid = part.part
